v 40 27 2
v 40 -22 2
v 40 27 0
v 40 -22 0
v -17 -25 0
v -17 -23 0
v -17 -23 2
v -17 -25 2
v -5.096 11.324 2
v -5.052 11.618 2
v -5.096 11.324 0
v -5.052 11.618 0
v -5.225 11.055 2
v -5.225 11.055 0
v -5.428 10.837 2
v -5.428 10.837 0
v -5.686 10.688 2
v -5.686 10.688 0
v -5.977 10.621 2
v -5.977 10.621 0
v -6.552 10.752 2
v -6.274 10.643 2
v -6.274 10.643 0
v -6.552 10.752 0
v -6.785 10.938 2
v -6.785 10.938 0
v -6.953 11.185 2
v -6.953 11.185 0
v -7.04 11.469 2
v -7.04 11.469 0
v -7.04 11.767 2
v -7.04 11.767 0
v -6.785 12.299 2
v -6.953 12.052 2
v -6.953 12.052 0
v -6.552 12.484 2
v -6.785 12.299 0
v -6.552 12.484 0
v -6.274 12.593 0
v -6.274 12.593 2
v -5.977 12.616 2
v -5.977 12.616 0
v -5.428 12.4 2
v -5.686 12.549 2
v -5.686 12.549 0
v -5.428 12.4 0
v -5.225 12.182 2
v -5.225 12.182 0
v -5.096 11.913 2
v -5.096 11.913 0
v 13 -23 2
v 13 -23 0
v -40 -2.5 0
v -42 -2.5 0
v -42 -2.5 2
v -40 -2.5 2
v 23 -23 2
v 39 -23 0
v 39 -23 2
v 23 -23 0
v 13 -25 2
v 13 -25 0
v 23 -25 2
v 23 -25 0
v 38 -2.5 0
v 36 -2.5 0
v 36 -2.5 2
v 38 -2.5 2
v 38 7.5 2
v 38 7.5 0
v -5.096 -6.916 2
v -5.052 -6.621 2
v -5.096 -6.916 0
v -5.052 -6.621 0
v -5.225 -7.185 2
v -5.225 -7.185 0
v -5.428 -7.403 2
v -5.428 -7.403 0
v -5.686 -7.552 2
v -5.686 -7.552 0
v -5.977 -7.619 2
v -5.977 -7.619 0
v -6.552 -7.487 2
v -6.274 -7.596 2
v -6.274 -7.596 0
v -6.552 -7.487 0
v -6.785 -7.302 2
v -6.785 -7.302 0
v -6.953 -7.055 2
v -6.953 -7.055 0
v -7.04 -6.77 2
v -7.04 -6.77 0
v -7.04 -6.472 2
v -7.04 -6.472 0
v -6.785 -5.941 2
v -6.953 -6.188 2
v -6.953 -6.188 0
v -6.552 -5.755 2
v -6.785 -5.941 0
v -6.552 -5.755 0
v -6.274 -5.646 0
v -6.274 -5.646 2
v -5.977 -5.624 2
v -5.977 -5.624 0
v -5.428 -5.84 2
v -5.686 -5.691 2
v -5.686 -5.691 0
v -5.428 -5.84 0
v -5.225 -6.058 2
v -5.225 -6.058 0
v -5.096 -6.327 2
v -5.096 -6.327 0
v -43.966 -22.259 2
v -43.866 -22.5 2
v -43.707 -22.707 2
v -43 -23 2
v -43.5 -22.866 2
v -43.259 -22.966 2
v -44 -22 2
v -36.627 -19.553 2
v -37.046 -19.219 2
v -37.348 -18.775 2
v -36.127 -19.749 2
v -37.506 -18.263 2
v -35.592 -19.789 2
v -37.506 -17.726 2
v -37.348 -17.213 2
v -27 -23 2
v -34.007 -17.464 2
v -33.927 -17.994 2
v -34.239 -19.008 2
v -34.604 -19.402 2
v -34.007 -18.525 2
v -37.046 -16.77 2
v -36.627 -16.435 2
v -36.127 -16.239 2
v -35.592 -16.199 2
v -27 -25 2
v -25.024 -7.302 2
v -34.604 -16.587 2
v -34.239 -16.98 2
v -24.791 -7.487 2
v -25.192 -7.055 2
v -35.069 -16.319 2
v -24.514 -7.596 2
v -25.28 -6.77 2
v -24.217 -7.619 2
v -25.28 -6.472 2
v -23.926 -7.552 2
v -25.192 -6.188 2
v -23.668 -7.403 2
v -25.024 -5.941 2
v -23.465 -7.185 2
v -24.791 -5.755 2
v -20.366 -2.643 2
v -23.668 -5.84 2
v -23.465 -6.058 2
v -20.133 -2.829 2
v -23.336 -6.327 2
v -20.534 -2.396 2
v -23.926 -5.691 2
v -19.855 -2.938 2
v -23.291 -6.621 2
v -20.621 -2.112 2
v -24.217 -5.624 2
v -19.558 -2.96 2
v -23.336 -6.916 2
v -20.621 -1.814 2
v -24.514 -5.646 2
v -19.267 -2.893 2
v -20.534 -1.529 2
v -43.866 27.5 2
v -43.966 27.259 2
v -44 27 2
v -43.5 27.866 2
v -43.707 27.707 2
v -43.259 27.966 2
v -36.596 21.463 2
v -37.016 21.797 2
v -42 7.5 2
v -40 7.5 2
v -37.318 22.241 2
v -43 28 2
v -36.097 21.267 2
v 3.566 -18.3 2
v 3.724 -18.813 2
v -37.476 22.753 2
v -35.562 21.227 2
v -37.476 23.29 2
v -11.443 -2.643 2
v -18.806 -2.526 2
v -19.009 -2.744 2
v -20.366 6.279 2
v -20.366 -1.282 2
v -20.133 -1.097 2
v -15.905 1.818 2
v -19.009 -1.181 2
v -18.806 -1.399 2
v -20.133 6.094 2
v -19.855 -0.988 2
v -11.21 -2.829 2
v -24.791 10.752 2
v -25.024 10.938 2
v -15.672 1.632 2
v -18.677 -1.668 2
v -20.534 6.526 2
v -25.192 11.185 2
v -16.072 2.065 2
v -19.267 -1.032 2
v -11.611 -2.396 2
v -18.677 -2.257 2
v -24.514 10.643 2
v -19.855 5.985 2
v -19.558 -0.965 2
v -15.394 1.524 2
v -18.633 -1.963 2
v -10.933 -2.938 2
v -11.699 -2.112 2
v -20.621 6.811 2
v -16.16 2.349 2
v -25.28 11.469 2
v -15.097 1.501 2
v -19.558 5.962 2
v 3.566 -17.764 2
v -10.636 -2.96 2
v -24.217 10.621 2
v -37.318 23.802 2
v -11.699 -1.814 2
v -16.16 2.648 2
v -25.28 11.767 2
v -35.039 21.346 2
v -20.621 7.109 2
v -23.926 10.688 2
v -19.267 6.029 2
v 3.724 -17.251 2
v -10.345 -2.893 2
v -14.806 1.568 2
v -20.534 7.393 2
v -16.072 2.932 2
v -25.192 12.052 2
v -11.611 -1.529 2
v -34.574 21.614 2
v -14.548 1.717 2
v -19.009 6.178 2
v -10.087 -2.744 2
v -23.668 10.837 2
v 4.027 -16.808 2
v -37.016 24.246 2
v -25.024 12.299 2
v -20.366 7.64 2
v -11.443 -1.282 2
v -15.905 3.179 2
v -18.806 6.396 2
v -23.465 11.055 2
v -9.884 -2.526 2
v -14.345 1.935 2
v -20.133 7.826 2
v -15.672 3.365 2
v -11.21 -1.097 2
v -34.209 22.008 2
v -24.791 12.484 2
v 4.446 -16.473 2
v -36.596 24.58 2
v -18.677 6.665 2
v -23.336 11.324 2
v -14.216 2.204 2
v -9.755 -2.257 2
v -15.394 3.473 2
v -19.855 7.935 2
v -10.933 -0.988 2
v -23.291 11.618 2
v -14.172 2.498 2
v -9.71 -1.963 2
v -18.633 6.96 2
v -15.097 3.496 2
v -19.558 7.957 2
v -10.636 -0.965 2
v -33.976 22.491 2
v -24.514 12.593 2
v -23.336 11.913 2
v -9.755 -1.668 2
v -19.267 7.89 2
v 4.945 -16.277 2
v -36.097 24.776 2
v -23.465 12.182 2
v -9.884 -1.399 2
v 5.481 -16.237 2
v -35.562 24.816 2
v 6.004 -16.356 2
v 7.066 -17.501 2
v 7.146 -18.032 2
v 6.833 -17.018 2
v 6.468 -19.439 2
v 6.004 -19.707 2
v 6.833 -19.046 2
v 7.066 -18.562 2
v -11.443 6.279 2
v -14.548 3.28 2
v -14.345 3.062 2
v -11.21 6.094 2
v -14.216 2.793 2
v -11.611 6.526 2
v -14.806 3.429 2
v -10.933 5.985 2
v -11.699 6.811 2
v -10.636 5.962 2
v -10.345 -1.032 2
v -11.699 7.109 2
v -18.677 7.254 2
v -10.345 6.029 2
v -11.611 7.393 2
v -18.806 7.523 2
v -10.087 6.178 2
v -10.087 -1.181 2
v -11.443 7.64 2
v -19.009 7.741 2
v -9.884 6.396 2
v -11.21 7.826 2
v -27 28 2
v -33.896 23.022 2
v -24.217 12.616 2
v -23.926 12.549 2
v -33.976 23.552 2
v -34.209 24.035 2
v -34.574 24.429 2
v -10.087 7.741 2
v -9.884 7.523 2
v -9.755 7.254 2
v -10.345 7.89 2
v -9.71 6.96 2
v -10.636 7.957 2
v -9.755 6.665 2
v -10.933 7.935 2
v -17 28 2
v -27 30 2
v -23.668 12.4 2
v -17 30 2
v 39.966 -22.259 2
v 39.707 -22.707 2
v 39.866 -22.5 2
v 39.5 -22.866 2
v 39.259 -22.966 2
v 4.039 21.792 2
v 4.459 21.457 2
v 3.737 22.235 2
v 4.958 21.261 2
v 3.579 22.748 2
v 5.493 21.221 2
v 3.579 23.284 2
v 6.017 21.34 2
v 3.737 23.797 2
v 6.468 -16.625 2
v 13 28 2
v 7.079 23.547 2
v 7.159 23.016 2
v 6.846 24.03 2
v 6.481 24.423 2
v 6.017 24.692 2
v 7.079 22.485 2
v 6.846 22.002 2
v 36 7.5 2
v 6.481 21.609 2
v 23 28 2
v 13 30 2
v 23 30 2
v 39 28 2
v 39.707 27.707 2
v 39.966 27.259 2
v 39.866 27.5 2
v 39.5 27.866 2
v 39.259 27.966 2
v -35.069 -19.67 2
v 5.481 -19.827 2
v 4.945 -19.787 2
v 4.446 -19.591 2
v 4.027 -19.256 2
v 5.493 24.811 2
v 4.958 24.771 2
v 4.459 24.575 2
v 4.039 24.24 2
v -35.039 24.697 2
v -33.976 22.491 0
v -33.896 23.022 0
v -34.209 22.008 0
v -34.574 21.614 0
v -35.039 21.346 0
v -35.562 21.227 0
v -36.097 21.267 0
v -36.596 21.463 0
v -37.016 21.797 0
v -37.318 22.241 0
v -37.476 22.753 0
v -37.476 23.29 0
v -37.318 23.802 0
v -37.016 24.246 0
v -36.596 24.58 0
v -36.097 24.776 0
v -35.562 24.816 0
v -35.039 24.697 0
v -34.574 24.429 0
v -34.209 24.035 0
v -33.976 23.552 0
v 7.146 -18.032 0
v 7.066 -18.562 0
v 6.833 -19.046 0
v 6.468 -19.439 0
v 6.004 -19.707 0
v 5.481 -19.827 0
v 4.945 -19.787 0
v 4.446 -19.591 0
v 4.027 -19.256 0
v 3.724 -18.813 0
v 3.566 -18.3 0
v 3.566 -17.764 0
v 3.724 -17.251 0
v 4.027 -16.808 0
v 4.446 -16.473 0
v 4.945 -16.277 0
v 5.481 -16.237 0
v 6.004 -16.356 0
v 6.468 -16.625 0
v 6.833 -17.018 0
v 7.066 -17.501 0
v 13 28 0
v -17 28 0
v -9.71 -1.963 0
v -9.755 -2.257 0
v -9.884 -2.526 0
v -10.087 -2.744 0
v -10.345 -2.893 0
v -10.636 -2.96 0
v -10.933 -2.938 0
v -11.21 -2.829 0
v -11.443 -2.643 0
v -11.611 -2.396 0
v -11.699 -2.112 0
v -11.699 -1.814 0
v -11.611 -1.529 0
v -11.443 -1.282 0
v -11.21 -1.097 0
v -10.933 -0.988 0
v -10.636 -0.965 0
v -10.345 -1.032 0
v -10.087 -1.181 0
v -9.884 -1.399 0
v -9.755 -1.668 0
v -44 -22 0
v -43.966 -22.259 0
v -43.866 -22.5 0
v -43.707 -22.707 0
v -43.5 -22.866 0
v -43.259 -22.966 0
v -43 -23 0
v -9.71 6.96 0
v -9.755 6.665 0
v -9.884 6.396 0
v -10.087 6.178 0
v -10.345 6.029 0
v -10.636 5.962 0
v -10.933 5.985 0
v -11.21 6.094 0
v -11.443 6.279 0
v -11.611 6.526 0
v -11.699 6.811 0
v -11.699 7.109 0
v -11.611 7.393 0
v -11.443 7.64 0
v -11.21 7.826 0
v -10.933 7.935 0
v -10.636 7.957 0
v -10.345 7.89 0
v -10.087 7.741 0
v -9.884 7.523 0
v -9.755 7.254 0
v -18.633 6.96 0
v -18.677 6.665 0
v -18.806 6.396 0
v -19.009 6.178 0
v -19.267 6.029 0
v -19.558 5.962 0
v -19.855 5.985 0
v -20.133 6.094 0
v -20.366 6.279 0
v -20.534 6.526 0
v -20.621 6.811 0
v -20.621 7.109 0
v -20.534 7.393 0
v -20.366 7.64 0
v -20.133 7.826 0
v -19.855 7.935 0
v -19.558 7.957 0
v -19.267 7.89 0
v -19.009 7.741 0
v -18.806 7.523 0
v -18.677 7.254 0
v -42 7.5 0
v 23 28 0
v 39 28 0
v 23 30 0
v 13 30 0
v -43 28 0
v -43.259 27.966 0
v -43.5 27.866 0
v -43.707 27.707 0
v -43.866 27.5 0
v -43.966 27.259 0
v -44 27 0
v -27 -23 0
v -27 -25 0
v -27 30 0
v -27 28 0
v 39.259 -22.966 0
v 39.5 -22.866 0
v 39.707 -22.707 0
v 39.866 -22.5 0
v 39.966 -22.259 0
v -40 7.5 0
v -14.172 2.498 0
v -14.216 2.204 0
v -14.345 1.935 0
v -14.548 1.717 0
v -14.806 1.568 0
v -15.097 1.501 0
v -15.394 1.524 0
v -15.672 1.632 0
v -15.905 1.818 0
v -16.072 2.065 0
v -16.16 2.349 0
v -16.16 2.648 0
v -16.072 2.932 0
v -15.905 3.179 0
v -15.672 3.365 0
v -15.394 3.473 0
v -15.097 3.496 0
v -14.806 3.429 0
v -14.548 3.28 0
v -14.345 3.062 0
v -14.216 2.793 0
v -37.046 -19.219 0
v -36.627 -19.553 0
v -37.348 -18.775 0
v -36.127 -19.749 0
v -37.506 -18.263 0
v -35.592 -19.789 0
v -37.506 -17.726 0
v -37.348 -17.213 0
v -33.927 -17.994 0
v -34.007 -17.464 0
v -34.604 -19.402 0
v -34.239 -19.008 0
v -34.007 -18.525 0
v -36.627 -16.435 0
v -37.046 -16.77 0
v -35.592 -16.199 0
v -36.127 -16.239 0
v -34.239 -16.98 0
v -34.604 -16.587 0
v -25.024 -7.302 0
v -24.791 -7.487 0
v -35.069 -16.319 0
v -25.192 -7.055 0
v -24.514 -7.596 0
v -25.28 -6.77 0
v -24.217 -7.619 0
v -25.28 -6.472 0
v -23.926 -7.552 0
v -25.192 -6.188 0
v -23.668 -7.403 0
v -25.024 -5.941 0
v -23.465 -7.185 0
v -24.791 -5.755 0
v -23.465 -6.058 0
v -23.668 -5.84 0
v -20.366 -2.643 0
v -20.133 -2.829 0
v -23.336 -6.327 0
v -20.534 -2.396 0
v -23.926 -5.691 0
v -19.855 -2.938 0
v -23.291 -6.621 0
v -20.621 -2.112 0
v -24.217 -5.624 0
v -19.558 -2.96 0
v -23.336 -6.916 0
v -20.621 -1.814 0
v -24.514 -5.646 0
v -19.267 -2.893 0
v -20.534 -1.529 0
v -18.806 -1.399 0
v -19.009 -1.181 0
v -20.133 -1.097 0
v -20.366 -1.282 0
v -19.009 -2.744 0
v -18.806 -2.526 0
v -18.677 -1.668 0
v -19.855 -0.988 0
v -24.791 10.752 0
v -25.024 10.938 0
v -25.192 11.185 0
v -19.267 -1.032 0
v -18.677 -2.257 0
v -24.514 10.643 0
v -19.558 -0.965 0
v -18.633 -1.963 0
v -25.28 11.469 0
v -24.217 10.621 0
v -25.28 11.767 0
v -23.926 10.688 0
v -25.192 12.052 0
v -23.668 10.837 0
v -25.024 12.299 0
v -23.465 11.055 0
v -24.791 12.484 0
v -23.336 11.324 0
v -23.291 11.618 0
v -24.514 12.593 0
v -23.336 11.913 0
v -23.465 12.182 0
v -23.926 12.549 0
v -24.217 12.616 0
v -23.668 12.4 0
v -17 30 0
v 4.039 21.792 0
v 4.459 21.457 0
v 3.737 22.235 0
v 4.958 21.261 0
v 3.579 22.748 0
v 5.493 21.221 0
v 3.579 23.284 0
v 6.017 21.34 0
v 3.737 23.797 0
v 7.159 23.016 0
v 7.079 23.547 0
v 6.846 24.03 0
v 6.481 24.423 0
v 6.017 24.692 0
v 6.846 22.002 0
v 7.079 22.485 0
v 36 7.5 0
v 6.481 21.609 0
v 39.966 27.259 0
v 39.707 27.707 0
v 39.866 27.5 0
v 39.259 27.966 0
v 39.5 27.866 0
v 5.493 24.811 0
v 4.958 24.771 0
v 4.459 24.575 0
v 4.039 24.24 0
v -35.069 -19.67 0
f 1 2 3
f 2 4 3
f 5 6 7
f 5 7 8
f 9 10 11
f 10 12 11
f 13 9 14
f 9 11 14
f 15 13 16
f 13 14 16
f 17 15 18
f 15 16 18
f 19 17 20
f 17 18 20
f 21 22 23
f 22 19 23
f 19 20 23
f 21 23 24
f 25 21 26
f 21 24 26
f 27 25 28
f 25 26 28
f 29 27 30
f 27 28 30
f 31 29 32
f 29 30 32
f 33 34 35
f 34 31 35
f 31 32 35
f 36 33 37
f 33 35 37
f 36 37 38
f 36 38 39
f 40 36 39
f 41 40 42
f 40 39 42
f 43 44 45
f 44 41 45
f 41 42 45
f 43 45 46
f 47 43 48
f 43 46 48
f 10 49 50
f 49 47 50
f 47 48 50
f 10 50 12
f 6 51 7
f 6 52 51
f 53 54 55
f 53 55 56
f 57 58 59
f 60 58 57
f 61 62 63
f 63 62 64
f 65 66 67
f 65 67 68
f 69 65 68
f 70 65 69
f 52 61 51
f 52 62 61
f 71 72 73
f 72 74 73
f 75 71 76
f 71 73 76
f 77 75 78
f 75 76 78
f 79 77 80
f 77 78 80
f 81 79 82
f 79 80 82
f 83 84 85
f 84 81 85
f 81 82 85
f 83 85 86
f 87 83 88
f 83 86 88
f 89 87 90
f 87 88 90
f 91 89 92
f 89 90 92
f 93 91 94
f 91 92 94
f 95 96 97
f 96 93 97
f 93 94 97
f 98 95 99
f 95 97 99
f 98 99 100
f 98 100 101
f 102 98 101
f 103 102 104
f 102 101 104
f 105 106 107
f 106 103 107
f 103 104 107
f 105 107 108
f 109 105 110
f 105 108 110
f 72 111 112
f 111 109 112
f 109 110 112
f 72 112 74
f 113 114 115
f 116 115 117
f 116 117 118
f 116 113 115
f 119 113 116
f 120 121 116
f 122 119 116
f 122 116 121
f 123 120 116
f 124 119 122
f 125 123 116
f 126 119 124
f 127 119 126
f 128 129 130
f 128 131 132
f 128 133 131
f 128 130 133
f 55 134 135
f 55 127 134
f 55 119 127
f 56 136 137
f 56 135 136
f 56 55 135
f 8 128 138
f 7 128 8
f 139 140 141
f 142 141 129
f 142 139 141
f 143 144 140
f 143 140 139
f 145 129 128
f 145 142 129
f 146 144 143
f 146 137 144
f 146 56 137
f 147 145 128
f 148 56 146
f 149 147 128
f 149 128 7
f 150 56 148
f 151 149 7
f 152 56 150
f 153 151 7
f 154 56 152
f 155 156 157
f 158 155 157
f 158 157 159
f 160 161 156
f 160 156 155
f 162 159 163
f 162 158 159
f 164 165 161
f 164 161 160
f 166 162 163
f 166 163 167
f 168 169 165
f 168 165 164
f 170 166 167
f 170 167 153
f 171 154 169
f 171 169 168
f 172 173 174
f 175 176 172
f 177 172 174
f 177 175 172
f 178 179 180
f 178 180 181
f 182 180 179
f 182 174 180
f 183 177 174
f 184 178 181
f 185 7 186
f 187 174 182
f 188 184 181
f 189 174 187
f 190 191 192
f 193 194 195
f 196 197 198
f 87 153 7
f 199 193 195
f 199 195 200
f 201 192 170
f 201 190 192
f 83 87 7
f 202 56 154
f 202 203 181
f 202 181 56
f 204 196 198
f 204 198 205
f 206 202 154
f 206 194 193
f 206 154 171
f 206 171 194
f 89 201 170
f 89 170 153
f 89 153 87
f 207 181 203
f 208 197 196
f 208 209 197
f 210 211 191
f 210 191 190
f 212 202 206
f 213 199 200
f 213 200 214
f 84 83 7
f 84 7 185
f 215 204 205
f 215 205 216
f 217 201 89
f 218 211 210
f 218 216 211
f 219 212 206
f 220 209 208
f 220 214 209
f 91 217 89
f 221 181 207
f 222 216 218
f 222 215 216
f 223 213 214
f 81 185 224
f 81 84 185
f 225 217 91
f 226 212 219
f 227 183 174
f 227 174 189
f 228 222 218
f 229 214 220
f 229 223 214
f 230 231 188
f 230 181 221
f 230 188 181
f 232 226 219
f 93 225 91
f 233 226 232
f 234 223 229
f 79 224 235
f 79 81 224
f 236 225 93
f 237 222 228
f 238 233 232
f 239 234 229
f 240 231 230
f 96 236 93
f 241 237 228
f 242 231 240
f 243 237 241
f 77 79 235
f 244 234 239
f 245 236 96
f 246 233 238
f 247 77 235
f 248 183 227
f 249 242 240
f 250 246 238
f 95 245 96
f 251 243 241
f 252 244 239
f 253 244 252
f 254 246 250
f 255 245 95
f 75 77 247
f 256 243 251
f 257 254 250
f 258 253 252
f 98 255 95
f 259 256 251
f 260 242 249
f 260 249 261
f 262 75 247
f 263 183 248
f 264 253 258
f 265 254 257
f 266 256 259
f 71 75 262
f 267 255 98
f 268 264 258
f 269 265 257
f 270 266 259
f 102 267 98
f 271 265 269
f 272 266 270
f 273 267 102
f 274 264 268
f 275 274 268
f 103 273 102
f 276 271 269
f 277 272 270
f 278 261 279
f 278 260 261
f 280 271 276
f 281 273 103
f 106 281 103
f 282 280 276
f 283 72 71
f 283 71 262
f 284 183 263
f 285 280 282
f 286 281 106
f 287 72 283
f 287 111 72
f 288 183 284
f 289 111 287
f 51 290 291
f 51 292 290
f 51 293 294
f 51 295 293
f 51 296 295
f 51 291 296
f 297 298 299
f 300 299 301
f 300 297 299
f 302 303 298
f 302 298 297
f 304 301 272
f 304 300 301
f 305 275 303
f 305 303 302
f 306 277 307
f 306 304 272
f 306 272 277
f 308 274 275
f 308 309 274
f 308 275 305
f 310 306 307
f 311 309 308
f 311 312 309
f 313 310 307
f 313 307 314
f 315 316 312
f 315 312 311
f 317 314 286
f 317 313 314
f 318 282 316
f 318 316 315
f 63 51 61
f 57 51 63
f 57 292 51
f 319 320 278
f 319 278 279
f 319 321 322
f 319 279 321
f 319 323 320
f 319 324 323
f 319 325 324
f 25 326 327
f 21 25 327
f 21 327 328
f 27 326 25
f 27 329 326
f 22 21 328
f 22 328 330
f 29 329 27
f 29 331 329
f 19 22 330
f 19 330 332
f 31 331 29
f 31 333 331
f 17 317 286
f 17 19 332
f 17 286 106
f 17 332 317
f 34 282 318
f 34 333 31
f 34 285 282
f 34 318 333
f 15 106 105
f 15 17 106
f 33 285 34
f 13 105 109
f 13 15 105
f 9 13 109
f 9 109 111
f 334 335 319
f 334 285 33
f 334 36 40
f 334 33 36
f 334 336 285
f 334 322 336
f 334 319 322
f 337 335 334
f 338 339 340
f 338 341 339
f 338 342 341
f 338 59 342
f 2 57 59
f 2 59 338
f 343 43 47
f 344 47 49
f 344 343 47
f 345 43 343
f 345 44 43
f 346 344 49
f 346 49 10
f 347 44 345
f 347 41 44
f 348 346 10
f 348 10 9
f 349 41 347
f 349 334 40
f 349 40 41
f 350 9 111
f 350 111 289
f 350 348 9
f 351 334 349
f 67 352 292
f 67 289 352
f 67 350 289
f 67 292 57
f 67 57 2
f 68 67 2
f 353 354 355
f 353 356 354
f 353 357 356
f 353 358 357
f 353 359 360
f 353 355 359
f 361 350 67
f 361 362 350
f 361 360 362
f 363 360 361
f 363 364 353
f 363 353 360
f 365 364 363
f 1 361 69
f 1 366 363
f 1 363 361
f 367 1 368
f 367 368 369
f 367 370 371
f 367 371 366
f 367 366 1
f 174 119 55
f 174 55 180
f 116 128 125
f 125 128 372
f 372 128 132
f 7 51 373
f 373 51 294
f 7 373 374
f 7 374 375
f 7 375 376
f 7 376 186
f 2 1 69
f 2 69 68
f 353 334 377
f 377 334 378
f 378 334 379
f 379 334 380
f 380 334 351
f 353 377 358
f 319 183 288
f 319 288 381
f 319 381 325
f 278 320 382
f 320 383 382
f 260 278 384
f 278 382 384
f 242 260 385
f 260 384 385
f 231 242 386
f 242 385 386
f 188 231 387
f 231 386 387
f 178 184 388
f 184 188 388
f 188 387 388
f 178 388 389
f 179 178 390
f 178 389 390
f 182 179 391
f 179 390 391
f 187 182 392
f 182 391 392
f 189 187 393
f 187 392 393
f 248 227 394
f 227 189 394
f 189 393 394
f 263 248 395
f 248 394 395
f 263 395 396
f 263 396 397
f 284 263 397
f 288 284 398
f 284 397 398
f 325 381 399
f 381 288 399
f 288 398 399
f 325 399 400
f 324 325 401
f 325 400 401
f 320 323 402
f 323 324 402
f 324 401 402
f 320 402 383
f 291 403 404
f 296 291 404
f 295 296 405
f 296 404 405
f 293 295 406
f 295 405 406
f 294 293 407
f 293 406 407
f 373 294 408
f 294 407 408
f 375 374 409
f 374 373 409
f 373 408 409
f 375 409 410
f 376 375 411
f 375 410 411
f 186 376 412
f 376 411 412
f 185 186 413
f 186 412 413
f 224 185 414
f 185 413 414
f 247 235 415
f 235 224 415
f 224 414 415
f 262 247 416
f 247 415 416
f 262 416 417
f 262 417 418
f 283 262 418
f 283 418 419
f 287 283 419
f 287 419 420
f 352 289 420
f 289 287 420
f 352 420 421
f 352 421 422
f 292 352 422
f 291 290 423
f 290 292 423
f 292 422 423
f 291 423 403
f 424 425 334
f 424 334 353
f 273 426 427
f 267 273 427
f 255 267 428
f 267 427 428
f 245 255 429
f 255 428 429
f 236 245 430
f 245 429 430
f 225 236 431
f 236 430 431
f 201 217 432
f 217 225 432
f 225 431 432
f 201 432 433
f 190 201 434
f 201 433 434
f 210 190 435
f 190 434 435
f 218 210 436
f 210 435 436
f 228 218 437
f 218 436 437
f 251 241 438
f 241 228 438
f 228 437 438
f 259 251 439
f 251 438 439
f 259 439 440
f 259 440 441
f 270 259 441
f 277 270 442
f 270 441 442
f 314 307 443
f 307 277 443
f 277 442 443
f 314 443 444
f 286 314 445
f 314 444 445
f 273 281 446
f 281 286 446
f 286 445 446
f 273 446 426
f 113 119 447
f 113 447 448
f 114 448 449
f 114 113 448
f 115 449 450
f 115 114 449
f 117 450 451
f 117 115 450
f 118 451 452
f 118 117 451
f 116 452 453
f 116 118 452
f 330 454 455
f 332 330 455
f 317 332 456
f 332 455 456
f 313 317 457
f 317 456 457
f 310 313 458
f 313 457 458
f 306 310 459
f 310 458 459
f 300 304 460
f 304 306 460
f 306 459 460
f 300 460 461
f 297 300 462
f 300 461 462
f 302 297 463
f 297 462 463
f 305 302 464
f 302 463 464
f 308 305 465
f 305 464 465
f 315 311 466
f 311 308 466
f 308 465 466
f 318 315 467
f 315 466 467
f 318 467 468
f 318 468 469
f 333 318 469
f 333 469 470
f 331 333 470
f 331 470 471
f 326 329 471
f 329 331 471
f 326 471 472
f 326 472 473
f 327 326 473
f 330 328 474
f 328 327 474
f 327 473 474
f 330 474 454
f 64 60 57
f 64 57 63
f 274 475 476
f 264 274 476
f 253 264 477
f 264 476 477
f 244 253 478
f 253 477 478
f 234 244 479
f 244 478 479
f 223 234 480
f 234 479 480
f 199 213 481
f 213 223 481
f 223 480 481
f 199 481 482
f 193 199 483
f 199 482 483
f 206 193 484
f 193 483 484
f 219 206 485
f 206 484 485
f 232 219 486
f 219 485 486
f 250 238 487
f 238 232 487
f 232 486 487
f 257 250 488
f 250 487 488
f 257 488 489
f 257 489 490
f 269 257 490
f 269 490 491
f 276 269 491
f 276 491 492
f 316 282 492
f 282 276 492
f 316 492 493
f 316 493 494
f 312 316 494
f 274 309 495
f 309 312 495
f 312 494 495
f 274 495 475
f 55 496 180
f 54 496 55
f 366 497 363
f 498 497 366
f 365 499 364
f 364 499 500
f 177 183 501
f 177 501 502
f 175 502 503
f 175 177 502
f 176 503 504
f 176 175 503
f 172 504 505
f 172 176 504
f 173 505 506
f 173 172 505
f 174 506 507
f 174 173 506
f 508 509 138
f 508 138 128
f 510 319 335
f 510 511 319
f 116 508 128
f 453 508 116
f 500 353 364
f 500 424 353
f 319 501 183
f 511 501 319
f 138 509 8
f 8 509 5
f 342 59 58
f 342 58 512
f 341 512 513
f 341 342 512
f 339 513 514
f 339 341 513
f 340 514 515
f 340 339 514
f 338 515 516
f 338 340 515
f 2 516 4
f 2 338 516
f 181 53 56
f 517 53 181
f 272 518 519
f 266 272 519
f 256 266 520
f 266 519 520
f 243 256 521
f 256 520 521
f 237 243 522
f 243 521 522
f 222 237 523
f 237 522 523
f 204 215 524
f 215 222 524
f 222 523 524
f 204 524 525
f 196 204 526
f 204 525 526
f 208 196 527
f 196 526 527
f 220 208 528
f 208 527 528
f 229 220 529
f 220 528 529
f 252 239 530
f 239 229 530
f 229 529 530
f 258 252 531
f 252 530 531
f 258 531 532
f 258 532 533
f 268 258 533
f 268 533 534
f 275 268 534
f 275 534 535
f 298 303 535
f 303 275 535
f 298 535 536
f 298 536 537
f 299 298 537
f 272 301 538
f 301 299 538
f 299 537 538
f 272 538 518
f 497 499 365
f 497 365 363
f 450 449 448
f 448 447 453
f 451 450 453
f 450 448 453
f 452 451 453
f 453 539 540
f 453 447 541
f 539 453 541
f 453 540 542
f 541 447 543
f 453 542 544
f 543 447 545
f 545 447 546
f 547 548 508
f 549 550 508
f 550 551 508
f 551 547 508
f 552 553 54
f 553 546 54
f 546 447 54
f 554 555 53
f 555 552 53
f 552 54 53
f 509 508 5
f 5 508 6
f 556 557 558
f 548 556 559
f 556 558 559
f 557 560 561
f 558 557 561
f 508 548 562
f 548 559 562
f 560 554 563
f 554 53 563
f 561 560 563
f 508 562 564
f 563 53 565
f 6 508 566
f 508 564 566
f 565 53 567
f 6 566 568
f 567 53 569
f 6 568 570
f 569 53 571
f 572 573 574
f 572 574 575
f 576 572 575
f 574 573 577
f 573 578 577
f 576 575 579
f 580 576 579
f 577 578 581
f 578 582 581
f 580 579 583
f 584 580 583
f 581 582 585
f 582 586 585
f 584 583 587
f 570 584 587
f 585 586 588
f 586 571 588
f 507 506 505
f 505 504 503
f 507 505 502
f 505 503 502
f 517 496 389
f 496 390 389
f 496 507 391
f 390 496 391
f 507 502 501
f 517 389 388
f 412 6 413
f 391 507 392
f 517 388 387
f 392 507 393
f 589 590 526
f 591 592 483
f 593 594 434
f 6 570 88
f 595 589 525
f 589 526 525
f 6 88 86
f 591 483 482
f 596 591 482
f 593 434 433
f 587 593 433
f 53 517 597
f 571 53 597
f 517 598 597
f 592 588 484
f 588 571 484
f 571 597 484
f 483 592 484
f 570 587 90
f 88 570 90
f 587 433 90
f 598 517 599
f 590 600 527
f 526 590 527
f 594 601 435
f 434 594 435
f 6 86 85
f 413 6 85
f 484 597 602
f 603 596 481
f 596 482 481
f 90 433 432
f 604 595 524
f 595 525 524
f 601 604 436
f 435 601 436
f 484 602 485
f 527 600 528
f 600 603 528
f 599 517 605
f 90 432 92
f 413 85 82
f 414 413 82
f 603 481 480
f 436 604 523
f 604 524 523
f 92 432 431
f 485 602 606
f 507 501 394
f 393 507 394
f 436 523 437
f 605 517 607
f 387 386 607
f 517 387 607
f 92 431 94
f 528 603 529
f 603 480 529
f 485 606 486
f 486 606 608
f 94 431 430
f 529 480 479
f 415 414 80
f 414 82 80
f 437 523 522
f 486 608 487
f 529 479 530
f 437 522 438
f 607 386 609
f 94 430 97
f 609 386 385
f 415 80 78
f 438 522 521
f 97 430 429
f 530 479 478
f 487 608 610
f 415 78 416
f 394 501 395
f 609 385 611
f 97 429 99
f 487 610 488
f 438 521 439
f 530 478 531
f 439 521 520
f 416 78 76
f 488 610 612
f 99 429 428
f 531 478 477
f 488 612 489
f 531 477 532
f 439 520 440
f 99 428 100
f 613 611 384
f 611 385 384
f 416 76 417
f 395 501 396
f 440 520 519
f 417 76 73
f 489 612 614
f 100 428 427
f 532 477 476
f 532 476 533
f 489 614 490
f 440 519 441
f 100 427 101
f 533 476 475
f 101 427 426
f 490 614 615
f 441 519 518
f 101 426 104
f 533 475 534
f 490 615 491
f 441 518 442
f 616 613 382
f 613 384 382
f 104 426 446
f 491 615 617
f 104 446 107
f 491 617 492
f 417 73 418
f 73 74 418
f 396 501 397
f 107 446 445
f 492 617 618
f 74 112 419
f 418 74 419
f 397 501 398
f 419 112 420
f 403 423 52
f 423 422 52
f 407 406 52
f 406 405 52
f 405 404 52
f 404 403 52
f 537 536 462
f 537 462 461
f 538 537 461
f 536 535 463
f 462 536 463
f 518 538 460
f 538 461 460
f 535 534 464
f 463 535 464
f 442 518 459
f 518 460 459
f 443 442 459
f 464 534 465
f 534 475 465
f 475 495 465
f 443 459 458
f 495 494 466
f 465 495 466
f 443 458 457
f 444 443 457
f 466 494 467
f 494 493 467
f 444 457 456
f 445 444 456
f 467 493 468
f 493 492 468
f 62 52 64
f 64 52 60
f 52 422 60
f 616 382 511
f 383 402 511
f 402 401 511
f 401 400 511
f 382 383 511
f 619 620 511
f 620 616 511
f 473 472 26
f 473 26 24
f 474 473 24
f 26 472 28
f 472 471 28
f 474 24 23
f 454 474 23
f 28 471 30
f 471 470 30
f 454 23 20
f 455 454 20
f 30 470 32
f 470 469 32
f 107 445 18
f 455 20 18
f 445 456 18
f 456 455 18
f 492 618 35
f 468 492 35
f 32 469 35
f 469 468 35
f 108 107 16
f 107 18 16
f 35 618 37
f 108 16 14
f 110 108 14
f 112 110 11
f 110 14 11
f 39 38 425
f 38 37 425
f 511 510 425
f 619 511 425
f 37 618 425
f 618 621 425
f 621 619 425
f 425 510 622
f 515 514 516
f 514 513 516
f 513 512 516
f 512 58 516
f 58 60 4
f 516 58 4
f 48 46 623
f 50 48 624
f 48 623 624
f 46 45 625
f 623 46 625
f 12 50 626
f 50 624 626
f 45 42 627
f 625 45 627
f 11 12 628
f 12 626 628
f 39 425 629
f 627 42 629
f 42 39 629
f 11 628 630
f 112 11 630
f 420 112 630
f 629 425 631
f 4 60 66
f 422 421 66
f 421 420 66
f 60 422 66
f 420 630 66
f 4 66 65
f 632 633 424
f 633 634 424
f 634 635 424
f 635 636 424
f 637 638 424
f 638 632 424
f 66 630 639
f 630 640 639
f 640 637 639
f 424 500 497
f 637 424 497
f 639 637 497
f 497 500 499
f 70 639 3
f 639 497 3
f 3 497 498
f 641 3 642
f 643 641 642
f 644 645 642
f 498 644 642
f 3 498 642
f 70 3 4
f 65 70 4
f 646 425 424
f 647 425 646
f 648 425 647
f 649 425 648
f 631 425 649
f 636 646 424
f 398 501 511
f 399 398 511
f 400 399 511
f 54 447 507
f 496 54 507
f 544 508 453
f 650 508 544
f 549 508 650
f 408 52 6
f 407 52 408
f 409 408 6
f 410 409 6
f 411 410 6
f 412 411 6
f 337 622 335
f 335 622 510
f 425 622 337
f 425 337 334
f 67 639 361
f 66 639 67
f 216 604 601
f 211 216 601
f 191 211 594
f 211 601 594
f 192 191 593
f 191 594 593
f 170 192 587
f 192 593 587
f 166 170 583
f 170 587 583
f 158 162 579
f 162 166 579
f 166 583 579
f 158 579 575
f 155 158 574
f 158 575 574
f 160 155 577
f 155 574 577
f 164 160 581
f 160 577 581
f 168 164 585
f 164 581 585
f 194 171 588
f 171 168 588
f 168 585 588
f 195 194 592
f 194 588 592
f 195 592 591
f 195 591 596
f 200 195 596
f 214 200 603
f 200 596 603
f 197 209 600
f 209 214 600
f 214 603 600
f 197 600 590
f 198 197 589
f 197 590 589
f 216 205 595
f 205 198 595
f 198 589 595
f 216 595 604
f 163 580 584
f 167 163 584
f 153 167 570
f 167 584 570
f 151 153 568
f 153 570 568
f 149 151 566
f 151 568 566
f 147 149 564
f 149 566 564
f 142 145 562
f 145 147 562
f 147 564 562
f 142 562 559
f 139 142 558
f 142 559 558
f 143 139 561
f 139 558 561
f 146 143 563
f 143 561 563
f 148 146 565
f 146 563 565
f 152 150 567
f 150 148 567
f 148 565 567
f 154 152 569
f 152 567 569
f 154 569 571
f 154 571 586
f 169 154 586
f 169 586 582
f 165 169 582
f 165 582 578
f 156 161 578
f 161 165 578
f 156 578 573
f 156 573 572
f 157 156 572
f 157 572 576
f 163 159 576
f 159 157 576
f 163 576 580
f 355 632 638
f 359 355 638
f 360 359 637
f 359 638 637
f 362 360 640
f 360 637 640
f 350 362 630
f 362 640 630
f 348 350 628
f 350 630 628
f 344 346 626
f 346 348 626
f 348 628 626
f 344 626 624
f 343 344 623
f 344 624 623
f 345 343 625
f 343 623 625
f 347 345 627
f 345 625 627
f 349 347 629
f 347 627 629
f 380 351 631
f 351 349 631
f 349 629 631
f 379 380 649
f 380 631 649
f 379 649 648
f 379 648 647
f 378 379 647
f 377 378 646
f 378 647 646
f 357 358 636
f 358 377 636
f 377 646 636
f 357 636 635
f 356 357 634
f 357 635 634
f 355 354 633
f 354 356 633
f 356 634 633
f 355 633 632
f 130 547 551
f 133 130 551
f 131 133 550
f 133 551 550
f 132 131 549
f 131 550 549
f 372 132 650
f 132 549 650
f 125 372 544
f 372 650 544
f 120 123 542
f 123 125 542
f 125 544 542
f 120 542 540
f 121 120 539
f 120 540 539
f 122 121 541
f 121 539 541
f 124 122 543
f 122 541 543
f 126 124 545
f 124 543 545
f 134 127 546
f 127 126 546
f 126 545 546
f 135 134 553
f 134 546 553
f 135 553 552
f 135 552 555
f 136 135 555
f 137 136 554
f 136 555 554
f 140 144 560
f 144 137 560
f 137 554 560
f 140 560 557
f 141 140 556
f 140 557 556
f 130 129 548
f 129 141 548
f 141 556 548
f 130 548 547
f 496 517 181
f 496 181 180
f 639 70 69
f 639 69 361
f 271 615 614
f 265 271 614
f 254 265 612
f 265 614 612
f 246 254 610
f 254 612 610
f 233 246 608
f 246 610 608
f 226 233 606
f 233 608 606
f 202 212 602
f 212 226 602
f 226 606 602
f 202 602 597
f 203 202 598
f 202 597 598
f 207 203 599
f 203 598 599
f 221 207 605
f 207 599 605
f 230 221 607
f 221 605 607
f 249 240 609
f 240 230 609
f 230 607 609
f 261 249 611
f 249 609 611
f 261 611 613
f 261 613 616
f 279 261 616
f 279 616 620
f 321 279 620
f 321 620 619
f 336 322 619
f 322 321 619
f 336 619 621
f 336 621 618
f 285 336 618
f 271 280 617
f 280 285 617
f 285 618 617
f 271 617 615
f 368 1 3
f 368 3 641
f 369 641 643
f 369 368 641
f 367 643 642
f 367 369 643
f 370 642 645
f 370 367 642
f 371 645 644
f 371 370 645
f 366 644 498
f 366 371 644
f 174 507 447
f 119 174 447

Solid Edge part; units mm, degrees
sketch "Sketch1" plane through (0, 0, 0) normal (0, 0, 1) x (1, 0, 0)
  line L0 (40, -25) -> (40, 30)
  line L1 (40, 30) -> (-44, 30)
  line L2 (-44, 30) -> (-44, -25)
  line L3 (-44, -25) -> (40, -25)
extrude "Protrusion1" add sketch "Sketch1" along normal blind 2
sketch "Sketch2" plane through (0, 0, 0) normal (0, 0, 1) x (1, 0, 0)
  line L0 (-44, 28) -> (-27, 28)
  line L1 (-27, 28) -> (-27, 30)
  line L2 (-27, 30) -> (-44, 30)
  line L3 (-44, 30) -> (-44, 28)
extrude "ExtrudedCutout_1" cut sketch "Sketch2" along normal blind 2
sketch "Sketch3" plane through (0, 0, 0) normal (0, 0, 1) x (1, 0, 0)
  line L0 (-17, 28) -> (13, 28)
  line L1 (13, 28) -> (13, 30)
  line L2 (13, 30) -> (-17, 30)
  line L3 (-17, 30) -> (-17, 28)
extrude "ExtrudedCutout_2" cut sketch "Sketch3" along normal blind 2
sketch "Sketch4" plane through (0, 0, 0) normal (0, 0, 1) x (1, 0, 0)
  line L0 (23, 28) -> (40, 28)
  line L1 (40, 28) -> (40, 30)
  line L2 (40, 30) -> (23, 30)
  line L3 (23, 30) -> (23, 28)
extrude "ExtrudedCutout_3" cut sketch "Sketch4" along normal blind 2
sketch "Sketch5" plane through (0, 0, 0) normal (0, 0, 1) x (1, 0, 0)
  line L0 (38, -2.5) -> (38, 7.5)
  line L1 (38, 7.5) -> (36, 7.5)
  line L2 (36, 7.5) -> (36, -2.5)
  line L3 (36, -2.5) -> (38, -2.5)
extrude "ExtrudedCutout_4" cut sketch "Sketch5" along normal blind 2
sketch "Sketch6" plane through (0, 0, 0) normal (0, 0, 1) x (1, 0, 0)
  line L0 (40, -23) -> (23, -23)
  line L1 (23, -23) -> (23, -25)
  line L2 (23, -25) -> (40, -25)
  line L3 (40, -25) -> (40, -23)
extrude "ExtrudedCutout_5" cut sketch "Sketch6" along normal blind 2
sketch "Sketch7" plane through (0, 0, 0) normal (0, 0, 1) x (1, 0, 0)
  line L0 (13, -23) -> (-17, -23)
  line L1 (-17, -23) -> (-17, -25)
  line L2 (-17, -25) -> (13, -25)
  line L3 (13, -25) -> (13, -23)
extrude "ExtrudedCutout_6" cut sketch "Sketch7" along normal blind 2
sketch "Sketch8" plane through (0, 0, 0) normal (0, 0, 1) x (1, 0, 0)
  line L0 (-27, -23) -> (-44, -23)
  line L1 (-44, -23) -> (-44, -25)
  line L2 (-44, -25) -> (-27, -25)
  line L3 (-27, -25) -> (-27, -23)
extrude "ExtrudedCutout_7" cut sketch "Sketch8" along normal blind 2
sketch "Sketch9" plane through (0, 0, 0) normal (0, 0, 1) x (1, 0, 0)
  line L0 (-40, -2.5) -> (-40, 7.5)
  line L1 (-40, 7.5) -> (-42, 7.5)
  line L2 (-42, 7.5) -> (-42, -2.5)
  line L3 (-42, -2.5) -> (-40, -2.5)
extrude "ExtrudedCutout_8" cut sketch "Sketch9" along normal blind 2
sketch "Sketch10" plane through (0, 0, 0) normal (0, 0, 1) x (1, 0, 0)
  circle A0 centre (-35.6965, 23.0215) radius 1.8
extrude "Cutout1" cut sketch "Sketch10" along normal blind 2
sketch "Sketch11" plane through (0, 0, 0) normal (0, 0, 1) x (1, 0, 0)
  circle A0 centre (5.3589, 23.016) radius 1.8
extrude "ExtrudedCutout_10" cut sketch "Sketch11" along normal blind 2
sketch "Sketch12" plane through (0, 0, 0) normal (0, 0, 1) x (1, 0, 0)
  circle A0 centre (-35.7266, -17.9943) radius 1.8
extrude "ExtrudedCutout_11" cut sketch "Sketch12" along normal blind 2
sketch "Sketch13" plane through (0, 0, 0) normal (0, 0, 1) x (1, 0, 0)
  circle A0 centre (5.346, -18.0319) radius 1.8
extrude "ExtrudedCutout_12" cut sketch "Sketch13" along normal blind 2
sketch "Sketch14" plane through (0, 0, 0) normal (0, 0, 1) x (1, 0, 0)
  circle A0 centre (-24.2914, 11.6184) radius 1
  circle A1 centre (-19.6326, 6.9596) radius 1
  circle A2 centre (-15.1715, 2.4985) radius 1
  circle A3 centre (-10.7104, 6.9596) radius 1
  circle A4 centre (-6.0516, 11.6184) radius 1
  circle A5 centre (-10.7104, -1.9626) radius 1
  circle A6 centre (-6.0516, -6.6214) radius 1
  circle A7 centre (-19.6326, -1.9626) radius 1
  circle A8 centre (-24.2914, -6.6214) radius 1
  dimension "D1" = 2
  dimension "D2" = 2
  dimension "D3" = 2
  dimension "D4" = 2
  dimension "D5" = 2
  dimension "D6" = 2
  dimension "D7" = 2
  dimension "D8" = 2
  dimension "D9" = 2
extrude "ExtrudedCutout_13" cut sketch "Sketch14" along normal blind 2
fillet "Round_1" radius 1 4 edges at (-44, -23, 1) (40, -23, 1) (40, 28, 1) (-44, 28, 1)
properties material "Acrylic, high impact grade"
